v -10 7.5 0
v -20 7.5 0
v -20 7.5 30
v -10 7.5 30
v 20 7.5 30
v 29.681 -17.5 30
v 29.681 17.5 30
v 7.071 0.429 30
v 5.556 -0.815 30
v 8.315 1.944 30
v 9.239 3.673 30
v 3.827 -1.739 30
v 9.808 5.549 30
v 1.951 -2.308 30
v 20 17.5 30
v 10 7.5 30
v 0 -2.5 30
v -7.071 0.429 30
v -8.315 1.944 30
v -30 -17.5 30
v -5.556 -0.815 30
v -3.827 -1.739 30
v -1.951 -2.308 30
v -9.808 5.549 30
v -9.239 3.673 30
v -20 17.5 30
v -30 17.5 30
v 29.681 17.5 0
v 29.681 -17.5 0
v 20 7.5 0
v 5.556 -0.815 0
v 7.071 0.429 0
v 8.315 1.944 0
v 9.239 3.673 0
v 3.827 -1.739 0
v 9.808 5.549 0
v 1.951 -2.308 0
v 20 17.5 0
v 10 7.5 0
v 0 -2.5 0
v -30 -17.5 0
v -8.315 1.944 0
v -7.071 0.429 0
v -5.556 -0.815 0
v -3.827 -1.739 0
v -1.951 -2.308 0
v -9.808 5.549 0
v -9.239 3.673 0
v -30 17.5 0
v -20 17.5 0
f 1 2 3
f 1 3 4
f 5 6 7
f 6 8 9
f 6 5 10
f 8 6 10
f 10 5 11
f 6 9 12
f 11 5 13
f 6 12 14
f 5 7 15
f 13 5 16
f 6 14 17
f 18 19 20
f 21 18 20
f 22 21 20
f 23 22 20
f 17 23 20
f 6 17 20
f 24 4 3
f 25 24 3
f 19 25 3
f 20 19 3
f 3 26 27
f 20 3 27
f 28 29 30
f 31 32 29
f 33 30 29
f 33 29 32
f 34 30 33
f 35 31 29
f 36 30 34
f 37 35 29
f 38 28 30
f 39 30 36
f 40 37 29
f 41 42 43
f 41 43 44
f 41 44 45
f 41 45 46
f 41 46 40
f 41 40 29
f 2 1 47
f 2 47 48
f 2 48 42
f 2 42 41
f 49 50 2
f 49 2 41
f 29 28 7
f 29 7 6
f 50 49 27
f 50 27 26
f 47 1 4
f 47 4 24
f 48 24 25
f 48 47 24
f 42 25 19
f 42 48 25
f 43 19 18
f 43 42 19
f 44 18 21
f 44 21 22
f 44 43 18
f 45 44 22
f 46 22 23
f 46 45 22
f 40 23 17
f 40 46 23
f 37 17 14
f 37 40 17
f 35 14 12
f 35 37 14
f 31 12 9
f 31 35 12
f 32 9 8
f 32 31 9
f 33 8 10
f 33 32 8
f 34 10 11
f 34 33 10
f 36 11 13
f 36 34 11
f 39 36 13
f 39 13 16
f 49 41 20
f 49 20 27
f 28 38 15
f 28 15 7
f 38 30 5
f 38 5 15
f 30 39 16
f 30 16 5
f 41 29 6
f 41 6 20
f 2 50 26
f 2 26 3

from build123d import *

# Parameters (mm, degrees)
BOSS_EXTRUDE2_DEPTH = 30


with BuildPart() as part:
    # Sketch1 → Boss-Extrude2 (new body)
    with BuildSketch(Plane.XY):
        with BuildLine():
            Line((-30, 17.5), (-20, 17.5))
            Line((-20, 17.5), (-20, 7.5))
            Line((-20, 7.5), (-10, 7.5))
            ThreePointArc((-10, 7.5), (0, -2.5), (10, 7.5))
            Line((10, 7.5), (20, 7.5))
            Line((20, 7.5), (20, 17.5))
            Line((20, 17.5), (29.681023884, 17.5))
            Line((29.681023884, 17.5), (29.681023884, 16.984704446))
            Line((29.681023884, 16.984704446), (29.681023884, -17.5))
            Line((29.681023884, -17.5), (-30, -17.5))
            Line((-30, -17.5), (-30, 16.984704446))
            Line((-30, 16.984704446), (-30, 17.5))
        make_face()
    extrude(amount=BOSS_EXTRUDE2_DEPTH)


solid = part.part
